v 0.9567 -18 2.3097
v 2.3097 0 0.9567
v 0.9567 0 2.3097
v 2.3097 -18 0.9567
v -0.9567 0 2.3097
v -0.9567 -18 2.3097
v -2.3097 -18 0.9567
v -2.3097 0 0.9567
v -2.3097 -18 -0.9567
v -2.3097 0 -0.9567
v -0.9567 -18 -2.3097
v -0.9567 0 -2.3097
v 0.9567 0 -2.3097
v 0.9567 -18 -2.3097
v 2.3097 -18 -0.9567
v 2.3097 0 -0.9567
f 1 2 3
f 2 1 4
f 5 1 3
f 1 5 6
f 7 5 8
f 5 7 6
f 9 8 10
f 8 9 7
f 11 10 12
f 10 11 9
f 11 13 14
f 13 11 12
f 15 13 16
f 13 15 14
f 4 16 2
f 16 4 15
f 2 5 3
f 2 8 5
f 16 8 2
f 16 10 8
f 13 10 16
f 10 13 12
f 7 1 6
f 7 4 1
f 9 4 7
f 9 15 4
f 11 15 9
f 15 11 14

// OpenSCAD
length = 18;
d = 5;
$fn = 8;

rotate([90, 0, 0])
  rotate([0, 0, 360/16])
    cylinder(h=length, d=d);
